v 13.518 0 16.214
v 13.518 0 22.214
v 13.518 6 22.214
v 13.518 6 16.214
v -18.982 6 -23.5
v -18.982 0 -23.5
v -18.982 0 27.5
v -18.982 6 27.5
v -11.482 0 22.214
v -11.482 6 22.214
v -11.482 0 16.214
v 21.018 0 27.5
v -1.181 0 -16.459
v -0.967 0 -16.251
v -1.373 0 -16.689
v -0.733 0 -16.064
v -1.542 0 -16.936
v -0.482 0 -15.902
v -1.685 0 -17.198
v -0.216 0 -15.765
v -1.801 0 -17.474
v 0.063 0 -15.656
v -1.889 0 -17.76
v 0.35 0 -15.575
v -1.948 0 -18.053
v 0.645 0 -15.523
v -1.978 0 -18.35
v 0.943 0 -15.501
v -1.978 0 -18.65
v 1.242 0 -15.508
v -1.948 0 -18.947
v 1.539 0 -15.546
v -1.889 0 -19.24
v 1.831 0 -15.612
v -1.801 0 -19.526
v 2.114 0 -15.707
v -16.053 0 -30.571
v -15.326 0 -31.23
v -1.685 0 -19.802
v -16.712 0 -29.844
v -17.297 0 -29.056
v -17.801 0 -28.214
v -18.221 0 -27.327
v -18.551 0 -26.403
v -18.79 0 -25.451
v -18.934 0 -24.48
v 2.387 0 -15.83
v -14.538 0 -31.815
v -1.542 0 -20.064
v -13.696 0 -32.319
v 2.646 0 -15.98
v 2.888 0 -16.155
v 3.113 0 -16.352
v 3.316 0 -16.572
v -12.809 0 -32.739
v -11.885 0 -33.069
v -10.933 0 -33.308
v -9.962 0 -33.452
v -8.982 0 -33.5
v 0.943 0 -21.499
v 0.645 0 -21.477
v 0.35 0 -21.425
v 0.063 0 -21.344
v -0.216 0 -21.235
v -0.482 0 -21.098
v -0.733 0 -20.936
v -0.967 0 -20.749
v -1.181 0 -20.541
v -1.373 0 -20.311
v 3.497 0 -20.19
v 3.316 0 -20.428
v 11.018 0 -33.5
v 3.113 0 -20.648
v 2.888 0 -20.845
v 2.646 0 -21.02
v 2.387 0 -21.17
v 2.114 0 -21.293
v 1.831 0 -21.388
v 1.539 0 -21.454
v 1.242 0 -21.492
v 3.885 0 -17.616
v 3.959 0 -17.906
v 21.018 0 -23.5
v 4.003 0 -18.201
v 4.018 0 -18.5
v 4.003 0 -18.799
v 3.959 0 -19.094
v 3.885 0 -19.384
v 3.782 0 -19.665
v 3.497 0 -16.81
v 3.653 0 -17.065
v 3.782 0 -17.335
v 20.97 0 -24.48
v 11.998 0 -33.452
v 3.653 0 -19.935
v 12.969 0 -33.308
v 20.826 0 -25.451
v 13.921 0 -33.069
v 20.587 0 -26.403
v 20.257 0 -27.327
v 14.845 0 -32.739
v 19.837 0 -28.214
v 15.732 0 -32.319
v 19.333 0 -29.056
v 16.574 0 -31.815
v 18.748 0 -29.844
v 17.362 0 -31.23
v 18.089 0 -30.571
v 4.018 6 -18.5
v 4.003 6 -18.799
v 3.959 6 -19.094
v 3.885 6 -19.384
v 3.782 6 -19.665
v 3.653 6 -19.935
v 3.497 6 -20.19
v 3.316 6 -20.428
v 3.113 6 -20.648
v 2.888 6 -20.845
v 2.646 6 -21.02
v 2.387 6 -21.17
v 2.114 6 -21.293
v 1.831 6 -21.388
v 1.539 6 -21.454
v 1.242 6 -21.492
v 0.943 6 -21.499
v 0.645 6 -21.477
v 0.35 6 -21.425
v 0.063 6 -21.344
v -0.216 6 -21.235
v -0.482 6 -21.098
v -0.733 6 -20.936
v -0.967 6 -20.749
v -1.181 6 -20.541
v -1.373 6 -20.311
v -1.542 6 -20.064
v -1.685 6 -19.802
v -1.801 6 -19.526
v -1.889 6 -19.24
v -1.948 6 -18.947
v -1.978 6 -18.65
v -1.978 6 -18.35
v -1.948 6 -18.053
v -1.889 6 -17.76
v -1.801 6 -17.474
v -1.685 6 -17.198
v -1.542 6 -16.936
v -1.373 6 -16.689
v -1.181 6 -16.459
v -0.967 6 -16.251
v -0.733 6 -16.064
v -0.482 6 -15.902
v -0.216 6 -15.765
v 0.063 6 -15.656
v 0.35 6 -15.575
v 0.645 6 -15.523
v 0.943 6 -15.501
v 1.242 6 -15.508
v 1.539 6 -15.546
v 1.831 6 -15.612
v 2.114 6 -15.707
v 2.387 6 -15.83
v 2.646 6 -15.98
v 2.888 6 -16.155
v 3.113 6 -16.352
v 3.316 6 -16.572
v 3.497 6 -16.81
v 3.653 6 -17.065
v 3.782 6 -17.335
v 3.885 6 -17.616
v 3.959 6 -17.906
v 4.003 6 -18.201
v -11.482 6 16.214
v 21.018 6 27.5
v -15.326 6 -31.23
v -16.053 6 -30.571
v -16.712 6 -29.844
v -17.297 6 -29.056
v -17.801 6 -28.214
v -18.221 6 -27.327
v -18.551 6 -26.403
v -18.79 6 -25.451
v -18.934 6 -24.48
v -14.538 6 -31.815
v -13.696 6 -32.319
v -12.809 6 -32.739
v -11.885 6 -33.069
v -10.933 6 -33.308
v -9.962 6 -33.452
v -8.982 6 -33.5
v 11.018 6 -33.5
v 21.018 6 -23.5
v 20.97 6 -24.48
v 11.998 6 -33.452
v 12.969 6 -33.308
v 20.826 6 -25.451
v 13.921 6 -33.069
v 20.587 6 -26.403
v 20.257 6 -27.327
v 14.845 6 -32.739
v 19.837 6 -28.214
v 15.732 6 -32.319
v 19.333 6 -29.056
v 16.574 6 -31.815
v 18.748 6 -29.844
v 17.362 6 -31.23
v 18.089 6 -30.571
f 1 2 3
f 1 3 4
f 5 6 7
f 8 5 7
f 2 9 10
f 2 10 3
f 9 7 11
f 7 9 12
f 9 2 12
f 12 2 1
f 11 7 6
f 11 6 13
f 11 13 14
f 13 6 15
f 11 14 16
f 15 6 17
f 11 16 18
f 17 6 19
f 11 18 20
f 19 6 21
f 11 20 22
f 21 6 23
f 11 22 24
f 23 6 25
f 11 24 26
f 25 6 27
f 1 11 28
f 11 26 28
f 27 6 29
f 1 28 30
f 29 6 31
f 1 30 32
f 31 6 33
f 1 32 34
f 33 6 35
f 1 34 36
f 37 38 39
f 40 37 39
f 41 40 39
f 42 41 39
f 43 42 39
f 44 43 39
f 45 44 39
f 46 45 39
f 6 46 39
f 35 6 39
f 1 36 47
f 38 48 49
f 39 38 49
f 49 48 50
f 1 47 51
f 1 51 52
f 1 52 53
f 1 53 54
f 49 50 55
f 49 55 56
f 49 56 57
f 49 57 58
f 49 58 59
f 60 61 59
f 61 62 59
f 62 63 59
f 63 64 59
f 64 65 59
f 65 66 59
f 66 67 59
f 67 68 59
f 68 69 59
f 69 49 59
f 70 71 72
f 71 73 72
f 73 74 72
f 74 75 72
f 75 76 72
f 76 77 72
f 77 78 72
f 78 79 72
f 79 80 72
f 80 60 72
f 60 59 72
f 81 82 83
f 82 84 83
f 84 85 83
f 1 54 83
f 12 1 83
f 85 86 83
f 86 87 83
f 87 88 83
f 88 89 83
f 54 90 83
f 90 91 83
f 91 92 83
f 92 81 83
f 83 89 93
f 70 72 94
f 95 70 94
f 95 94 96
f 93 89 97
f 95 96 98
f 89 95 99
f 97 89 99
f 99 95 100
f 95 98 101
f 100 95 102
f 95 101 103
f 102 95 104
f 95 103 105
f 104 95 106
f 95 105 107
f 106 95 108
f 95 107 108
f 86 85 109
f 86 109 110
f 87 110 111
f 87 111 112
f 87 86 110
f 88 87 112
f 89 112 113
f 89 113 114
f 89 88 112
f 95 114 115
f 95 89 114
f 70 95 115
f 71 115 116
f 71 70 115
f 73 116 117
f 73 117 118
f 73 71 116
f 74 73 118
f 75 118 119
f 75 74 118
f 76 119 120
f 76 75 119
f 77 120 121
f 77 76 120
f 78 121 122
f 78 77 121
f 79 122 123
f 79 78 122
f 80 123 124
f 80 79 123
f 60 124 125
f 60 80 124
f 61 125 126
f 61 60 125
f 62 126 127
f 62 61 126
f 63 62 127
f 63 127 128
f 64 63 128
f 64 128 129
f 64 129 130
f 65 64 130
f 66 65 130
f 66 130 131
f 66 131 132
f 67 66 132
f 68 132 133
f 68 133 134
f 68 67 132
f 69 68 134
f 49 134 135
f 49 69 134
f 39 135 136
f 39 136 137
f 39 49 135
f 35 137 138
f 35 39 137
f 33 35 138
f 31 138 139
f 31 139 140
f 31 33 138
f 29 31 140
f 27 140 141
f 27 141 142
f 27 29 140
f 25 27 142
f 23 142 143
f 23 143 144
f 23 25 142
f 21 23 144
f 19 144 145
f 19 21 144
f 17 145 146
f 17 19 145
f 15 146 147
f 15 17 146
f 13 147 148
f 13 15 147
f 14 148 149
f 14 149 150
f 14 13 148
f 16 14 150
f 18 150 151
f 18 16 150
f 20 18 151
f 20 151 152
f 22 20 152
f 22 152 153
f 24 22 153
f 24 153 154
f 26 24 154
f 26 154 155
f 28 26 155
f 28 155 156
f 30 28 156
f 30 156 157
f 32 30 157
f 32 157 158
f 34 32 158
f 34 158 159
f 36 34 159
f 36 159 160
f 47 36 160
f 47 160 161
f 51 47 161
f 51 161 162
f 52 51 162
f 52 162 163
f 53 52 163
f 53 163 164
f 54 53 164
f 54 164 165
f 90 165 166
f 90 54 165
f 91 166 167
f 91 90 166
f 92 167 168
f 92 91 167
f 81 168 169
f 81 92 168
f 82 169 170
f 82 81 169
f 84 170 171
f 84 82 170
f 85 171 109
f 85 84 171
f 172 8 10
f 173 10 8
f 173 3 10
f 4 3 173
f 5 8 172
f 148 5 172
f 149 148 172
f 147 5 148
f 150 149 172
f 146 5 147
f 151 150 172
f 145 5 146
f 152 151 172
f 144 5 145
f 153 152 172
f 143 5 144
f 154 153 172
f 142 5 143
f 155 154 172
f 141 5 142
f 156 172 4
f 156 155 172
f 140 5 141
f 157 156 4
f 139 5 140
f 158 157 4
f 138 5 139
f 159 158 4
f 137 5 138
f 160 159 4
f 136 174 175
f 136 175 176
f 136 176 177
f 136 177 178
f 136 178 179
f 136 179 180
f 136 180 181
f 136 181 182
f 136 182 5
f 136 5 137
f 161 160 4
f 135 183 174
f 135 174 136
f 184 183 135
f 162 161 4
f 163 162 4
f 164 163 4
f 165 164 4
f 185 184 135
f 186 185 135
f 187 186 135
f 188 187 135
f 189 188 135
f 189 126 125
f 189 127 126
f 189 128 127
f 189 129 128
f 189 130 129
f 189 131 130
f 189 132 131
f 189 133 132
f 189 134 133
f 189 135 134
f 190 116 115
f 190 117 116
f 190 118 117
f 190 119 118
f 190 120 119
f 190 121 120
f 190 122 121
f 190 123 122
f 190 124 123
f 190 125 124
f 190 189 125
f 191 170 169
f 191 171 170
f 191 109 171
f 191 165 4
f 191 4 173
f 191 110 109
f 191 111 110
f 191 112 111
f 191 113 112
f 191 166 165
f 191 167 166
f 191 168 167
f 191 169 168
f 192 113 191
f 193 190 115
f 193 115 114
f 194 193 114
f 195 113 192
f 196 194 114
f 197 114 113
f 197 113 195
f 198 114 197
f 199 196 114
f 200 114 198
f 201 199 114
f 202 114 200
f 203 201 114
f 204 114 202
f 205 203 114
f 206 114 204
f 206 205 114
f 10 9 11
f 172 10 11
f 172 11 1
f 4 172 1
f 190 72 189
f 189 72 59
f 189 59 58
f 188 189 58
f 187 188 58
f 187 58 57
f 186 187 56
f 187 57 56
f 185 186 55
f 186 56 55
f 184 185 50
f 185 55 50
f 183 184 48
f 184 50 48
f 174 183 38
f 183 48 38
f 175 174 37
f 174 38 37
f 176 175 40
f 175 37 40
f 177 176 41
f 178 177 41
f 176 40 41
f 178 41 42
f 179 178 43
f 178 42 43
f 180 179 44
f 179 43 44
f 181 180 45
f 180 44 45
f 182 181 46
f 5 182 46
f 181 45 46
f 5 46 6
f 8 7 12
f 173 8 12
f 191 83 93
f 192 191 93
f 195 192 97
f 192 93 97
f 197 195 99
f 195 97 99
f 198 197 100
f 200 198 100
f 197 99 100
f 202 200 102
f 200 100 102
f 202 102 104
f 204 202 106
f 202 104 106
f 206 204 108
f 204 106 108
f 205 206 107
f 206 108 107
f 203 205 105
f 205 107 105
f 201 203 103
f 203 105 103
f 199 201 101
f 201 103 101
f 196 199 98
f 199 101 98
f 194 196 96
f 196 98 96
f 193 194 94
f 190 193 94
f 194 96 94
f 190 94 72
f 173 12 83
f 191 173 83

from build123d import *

# Parameters (mm, degrees)
SKETCH1_R           = 3
SKETCH1_W           = 25
SKETCH1_H           = 6
BOSS_EXTRUDE1_DEPTH = 6


with BuildPart() as part:
    # Sketch1 → Boss-Extrude1 (new body)
    with BuildSketch(Plane(origin=(0, 0, 0), x_dir=(1, 0, 0), z_dir=(0, 1, 0))):
        with BuildLine():
            Line((-18.981997388, -27.5), (21.018002612, -27.5))
            Line((21.018002612, -27.5), (21.018002612, 23.5))
            ThreePointArc((21.018002612, 23.5), (18.089070424, 30.571067812), (11.018002612, 33.5))
            Line((11.018002612, 33.5), (-8.981997388, 33.5))
            ThreePointArc((-8.981997388, 33.5), (-16.053065199, 30.571067812), (-18.981997388, 23.5))
            Line((-18.981997388, 23.5), (-18.981997388, -27.5))
        make_face()
        with Locations((1.018002612, 18.5)):
            Circle(SKETCH1_R, mode=Mode.SUBTRACT)
        with Locations((1.018002612, -19.214324507)):
            Rectangle(SKETCH1_W, SKETCH1_H, mode=Mode.SUBTRACT)
    extrude(amount=BOSS_EXTRUDE1_DEPTH)


solid = part.part
